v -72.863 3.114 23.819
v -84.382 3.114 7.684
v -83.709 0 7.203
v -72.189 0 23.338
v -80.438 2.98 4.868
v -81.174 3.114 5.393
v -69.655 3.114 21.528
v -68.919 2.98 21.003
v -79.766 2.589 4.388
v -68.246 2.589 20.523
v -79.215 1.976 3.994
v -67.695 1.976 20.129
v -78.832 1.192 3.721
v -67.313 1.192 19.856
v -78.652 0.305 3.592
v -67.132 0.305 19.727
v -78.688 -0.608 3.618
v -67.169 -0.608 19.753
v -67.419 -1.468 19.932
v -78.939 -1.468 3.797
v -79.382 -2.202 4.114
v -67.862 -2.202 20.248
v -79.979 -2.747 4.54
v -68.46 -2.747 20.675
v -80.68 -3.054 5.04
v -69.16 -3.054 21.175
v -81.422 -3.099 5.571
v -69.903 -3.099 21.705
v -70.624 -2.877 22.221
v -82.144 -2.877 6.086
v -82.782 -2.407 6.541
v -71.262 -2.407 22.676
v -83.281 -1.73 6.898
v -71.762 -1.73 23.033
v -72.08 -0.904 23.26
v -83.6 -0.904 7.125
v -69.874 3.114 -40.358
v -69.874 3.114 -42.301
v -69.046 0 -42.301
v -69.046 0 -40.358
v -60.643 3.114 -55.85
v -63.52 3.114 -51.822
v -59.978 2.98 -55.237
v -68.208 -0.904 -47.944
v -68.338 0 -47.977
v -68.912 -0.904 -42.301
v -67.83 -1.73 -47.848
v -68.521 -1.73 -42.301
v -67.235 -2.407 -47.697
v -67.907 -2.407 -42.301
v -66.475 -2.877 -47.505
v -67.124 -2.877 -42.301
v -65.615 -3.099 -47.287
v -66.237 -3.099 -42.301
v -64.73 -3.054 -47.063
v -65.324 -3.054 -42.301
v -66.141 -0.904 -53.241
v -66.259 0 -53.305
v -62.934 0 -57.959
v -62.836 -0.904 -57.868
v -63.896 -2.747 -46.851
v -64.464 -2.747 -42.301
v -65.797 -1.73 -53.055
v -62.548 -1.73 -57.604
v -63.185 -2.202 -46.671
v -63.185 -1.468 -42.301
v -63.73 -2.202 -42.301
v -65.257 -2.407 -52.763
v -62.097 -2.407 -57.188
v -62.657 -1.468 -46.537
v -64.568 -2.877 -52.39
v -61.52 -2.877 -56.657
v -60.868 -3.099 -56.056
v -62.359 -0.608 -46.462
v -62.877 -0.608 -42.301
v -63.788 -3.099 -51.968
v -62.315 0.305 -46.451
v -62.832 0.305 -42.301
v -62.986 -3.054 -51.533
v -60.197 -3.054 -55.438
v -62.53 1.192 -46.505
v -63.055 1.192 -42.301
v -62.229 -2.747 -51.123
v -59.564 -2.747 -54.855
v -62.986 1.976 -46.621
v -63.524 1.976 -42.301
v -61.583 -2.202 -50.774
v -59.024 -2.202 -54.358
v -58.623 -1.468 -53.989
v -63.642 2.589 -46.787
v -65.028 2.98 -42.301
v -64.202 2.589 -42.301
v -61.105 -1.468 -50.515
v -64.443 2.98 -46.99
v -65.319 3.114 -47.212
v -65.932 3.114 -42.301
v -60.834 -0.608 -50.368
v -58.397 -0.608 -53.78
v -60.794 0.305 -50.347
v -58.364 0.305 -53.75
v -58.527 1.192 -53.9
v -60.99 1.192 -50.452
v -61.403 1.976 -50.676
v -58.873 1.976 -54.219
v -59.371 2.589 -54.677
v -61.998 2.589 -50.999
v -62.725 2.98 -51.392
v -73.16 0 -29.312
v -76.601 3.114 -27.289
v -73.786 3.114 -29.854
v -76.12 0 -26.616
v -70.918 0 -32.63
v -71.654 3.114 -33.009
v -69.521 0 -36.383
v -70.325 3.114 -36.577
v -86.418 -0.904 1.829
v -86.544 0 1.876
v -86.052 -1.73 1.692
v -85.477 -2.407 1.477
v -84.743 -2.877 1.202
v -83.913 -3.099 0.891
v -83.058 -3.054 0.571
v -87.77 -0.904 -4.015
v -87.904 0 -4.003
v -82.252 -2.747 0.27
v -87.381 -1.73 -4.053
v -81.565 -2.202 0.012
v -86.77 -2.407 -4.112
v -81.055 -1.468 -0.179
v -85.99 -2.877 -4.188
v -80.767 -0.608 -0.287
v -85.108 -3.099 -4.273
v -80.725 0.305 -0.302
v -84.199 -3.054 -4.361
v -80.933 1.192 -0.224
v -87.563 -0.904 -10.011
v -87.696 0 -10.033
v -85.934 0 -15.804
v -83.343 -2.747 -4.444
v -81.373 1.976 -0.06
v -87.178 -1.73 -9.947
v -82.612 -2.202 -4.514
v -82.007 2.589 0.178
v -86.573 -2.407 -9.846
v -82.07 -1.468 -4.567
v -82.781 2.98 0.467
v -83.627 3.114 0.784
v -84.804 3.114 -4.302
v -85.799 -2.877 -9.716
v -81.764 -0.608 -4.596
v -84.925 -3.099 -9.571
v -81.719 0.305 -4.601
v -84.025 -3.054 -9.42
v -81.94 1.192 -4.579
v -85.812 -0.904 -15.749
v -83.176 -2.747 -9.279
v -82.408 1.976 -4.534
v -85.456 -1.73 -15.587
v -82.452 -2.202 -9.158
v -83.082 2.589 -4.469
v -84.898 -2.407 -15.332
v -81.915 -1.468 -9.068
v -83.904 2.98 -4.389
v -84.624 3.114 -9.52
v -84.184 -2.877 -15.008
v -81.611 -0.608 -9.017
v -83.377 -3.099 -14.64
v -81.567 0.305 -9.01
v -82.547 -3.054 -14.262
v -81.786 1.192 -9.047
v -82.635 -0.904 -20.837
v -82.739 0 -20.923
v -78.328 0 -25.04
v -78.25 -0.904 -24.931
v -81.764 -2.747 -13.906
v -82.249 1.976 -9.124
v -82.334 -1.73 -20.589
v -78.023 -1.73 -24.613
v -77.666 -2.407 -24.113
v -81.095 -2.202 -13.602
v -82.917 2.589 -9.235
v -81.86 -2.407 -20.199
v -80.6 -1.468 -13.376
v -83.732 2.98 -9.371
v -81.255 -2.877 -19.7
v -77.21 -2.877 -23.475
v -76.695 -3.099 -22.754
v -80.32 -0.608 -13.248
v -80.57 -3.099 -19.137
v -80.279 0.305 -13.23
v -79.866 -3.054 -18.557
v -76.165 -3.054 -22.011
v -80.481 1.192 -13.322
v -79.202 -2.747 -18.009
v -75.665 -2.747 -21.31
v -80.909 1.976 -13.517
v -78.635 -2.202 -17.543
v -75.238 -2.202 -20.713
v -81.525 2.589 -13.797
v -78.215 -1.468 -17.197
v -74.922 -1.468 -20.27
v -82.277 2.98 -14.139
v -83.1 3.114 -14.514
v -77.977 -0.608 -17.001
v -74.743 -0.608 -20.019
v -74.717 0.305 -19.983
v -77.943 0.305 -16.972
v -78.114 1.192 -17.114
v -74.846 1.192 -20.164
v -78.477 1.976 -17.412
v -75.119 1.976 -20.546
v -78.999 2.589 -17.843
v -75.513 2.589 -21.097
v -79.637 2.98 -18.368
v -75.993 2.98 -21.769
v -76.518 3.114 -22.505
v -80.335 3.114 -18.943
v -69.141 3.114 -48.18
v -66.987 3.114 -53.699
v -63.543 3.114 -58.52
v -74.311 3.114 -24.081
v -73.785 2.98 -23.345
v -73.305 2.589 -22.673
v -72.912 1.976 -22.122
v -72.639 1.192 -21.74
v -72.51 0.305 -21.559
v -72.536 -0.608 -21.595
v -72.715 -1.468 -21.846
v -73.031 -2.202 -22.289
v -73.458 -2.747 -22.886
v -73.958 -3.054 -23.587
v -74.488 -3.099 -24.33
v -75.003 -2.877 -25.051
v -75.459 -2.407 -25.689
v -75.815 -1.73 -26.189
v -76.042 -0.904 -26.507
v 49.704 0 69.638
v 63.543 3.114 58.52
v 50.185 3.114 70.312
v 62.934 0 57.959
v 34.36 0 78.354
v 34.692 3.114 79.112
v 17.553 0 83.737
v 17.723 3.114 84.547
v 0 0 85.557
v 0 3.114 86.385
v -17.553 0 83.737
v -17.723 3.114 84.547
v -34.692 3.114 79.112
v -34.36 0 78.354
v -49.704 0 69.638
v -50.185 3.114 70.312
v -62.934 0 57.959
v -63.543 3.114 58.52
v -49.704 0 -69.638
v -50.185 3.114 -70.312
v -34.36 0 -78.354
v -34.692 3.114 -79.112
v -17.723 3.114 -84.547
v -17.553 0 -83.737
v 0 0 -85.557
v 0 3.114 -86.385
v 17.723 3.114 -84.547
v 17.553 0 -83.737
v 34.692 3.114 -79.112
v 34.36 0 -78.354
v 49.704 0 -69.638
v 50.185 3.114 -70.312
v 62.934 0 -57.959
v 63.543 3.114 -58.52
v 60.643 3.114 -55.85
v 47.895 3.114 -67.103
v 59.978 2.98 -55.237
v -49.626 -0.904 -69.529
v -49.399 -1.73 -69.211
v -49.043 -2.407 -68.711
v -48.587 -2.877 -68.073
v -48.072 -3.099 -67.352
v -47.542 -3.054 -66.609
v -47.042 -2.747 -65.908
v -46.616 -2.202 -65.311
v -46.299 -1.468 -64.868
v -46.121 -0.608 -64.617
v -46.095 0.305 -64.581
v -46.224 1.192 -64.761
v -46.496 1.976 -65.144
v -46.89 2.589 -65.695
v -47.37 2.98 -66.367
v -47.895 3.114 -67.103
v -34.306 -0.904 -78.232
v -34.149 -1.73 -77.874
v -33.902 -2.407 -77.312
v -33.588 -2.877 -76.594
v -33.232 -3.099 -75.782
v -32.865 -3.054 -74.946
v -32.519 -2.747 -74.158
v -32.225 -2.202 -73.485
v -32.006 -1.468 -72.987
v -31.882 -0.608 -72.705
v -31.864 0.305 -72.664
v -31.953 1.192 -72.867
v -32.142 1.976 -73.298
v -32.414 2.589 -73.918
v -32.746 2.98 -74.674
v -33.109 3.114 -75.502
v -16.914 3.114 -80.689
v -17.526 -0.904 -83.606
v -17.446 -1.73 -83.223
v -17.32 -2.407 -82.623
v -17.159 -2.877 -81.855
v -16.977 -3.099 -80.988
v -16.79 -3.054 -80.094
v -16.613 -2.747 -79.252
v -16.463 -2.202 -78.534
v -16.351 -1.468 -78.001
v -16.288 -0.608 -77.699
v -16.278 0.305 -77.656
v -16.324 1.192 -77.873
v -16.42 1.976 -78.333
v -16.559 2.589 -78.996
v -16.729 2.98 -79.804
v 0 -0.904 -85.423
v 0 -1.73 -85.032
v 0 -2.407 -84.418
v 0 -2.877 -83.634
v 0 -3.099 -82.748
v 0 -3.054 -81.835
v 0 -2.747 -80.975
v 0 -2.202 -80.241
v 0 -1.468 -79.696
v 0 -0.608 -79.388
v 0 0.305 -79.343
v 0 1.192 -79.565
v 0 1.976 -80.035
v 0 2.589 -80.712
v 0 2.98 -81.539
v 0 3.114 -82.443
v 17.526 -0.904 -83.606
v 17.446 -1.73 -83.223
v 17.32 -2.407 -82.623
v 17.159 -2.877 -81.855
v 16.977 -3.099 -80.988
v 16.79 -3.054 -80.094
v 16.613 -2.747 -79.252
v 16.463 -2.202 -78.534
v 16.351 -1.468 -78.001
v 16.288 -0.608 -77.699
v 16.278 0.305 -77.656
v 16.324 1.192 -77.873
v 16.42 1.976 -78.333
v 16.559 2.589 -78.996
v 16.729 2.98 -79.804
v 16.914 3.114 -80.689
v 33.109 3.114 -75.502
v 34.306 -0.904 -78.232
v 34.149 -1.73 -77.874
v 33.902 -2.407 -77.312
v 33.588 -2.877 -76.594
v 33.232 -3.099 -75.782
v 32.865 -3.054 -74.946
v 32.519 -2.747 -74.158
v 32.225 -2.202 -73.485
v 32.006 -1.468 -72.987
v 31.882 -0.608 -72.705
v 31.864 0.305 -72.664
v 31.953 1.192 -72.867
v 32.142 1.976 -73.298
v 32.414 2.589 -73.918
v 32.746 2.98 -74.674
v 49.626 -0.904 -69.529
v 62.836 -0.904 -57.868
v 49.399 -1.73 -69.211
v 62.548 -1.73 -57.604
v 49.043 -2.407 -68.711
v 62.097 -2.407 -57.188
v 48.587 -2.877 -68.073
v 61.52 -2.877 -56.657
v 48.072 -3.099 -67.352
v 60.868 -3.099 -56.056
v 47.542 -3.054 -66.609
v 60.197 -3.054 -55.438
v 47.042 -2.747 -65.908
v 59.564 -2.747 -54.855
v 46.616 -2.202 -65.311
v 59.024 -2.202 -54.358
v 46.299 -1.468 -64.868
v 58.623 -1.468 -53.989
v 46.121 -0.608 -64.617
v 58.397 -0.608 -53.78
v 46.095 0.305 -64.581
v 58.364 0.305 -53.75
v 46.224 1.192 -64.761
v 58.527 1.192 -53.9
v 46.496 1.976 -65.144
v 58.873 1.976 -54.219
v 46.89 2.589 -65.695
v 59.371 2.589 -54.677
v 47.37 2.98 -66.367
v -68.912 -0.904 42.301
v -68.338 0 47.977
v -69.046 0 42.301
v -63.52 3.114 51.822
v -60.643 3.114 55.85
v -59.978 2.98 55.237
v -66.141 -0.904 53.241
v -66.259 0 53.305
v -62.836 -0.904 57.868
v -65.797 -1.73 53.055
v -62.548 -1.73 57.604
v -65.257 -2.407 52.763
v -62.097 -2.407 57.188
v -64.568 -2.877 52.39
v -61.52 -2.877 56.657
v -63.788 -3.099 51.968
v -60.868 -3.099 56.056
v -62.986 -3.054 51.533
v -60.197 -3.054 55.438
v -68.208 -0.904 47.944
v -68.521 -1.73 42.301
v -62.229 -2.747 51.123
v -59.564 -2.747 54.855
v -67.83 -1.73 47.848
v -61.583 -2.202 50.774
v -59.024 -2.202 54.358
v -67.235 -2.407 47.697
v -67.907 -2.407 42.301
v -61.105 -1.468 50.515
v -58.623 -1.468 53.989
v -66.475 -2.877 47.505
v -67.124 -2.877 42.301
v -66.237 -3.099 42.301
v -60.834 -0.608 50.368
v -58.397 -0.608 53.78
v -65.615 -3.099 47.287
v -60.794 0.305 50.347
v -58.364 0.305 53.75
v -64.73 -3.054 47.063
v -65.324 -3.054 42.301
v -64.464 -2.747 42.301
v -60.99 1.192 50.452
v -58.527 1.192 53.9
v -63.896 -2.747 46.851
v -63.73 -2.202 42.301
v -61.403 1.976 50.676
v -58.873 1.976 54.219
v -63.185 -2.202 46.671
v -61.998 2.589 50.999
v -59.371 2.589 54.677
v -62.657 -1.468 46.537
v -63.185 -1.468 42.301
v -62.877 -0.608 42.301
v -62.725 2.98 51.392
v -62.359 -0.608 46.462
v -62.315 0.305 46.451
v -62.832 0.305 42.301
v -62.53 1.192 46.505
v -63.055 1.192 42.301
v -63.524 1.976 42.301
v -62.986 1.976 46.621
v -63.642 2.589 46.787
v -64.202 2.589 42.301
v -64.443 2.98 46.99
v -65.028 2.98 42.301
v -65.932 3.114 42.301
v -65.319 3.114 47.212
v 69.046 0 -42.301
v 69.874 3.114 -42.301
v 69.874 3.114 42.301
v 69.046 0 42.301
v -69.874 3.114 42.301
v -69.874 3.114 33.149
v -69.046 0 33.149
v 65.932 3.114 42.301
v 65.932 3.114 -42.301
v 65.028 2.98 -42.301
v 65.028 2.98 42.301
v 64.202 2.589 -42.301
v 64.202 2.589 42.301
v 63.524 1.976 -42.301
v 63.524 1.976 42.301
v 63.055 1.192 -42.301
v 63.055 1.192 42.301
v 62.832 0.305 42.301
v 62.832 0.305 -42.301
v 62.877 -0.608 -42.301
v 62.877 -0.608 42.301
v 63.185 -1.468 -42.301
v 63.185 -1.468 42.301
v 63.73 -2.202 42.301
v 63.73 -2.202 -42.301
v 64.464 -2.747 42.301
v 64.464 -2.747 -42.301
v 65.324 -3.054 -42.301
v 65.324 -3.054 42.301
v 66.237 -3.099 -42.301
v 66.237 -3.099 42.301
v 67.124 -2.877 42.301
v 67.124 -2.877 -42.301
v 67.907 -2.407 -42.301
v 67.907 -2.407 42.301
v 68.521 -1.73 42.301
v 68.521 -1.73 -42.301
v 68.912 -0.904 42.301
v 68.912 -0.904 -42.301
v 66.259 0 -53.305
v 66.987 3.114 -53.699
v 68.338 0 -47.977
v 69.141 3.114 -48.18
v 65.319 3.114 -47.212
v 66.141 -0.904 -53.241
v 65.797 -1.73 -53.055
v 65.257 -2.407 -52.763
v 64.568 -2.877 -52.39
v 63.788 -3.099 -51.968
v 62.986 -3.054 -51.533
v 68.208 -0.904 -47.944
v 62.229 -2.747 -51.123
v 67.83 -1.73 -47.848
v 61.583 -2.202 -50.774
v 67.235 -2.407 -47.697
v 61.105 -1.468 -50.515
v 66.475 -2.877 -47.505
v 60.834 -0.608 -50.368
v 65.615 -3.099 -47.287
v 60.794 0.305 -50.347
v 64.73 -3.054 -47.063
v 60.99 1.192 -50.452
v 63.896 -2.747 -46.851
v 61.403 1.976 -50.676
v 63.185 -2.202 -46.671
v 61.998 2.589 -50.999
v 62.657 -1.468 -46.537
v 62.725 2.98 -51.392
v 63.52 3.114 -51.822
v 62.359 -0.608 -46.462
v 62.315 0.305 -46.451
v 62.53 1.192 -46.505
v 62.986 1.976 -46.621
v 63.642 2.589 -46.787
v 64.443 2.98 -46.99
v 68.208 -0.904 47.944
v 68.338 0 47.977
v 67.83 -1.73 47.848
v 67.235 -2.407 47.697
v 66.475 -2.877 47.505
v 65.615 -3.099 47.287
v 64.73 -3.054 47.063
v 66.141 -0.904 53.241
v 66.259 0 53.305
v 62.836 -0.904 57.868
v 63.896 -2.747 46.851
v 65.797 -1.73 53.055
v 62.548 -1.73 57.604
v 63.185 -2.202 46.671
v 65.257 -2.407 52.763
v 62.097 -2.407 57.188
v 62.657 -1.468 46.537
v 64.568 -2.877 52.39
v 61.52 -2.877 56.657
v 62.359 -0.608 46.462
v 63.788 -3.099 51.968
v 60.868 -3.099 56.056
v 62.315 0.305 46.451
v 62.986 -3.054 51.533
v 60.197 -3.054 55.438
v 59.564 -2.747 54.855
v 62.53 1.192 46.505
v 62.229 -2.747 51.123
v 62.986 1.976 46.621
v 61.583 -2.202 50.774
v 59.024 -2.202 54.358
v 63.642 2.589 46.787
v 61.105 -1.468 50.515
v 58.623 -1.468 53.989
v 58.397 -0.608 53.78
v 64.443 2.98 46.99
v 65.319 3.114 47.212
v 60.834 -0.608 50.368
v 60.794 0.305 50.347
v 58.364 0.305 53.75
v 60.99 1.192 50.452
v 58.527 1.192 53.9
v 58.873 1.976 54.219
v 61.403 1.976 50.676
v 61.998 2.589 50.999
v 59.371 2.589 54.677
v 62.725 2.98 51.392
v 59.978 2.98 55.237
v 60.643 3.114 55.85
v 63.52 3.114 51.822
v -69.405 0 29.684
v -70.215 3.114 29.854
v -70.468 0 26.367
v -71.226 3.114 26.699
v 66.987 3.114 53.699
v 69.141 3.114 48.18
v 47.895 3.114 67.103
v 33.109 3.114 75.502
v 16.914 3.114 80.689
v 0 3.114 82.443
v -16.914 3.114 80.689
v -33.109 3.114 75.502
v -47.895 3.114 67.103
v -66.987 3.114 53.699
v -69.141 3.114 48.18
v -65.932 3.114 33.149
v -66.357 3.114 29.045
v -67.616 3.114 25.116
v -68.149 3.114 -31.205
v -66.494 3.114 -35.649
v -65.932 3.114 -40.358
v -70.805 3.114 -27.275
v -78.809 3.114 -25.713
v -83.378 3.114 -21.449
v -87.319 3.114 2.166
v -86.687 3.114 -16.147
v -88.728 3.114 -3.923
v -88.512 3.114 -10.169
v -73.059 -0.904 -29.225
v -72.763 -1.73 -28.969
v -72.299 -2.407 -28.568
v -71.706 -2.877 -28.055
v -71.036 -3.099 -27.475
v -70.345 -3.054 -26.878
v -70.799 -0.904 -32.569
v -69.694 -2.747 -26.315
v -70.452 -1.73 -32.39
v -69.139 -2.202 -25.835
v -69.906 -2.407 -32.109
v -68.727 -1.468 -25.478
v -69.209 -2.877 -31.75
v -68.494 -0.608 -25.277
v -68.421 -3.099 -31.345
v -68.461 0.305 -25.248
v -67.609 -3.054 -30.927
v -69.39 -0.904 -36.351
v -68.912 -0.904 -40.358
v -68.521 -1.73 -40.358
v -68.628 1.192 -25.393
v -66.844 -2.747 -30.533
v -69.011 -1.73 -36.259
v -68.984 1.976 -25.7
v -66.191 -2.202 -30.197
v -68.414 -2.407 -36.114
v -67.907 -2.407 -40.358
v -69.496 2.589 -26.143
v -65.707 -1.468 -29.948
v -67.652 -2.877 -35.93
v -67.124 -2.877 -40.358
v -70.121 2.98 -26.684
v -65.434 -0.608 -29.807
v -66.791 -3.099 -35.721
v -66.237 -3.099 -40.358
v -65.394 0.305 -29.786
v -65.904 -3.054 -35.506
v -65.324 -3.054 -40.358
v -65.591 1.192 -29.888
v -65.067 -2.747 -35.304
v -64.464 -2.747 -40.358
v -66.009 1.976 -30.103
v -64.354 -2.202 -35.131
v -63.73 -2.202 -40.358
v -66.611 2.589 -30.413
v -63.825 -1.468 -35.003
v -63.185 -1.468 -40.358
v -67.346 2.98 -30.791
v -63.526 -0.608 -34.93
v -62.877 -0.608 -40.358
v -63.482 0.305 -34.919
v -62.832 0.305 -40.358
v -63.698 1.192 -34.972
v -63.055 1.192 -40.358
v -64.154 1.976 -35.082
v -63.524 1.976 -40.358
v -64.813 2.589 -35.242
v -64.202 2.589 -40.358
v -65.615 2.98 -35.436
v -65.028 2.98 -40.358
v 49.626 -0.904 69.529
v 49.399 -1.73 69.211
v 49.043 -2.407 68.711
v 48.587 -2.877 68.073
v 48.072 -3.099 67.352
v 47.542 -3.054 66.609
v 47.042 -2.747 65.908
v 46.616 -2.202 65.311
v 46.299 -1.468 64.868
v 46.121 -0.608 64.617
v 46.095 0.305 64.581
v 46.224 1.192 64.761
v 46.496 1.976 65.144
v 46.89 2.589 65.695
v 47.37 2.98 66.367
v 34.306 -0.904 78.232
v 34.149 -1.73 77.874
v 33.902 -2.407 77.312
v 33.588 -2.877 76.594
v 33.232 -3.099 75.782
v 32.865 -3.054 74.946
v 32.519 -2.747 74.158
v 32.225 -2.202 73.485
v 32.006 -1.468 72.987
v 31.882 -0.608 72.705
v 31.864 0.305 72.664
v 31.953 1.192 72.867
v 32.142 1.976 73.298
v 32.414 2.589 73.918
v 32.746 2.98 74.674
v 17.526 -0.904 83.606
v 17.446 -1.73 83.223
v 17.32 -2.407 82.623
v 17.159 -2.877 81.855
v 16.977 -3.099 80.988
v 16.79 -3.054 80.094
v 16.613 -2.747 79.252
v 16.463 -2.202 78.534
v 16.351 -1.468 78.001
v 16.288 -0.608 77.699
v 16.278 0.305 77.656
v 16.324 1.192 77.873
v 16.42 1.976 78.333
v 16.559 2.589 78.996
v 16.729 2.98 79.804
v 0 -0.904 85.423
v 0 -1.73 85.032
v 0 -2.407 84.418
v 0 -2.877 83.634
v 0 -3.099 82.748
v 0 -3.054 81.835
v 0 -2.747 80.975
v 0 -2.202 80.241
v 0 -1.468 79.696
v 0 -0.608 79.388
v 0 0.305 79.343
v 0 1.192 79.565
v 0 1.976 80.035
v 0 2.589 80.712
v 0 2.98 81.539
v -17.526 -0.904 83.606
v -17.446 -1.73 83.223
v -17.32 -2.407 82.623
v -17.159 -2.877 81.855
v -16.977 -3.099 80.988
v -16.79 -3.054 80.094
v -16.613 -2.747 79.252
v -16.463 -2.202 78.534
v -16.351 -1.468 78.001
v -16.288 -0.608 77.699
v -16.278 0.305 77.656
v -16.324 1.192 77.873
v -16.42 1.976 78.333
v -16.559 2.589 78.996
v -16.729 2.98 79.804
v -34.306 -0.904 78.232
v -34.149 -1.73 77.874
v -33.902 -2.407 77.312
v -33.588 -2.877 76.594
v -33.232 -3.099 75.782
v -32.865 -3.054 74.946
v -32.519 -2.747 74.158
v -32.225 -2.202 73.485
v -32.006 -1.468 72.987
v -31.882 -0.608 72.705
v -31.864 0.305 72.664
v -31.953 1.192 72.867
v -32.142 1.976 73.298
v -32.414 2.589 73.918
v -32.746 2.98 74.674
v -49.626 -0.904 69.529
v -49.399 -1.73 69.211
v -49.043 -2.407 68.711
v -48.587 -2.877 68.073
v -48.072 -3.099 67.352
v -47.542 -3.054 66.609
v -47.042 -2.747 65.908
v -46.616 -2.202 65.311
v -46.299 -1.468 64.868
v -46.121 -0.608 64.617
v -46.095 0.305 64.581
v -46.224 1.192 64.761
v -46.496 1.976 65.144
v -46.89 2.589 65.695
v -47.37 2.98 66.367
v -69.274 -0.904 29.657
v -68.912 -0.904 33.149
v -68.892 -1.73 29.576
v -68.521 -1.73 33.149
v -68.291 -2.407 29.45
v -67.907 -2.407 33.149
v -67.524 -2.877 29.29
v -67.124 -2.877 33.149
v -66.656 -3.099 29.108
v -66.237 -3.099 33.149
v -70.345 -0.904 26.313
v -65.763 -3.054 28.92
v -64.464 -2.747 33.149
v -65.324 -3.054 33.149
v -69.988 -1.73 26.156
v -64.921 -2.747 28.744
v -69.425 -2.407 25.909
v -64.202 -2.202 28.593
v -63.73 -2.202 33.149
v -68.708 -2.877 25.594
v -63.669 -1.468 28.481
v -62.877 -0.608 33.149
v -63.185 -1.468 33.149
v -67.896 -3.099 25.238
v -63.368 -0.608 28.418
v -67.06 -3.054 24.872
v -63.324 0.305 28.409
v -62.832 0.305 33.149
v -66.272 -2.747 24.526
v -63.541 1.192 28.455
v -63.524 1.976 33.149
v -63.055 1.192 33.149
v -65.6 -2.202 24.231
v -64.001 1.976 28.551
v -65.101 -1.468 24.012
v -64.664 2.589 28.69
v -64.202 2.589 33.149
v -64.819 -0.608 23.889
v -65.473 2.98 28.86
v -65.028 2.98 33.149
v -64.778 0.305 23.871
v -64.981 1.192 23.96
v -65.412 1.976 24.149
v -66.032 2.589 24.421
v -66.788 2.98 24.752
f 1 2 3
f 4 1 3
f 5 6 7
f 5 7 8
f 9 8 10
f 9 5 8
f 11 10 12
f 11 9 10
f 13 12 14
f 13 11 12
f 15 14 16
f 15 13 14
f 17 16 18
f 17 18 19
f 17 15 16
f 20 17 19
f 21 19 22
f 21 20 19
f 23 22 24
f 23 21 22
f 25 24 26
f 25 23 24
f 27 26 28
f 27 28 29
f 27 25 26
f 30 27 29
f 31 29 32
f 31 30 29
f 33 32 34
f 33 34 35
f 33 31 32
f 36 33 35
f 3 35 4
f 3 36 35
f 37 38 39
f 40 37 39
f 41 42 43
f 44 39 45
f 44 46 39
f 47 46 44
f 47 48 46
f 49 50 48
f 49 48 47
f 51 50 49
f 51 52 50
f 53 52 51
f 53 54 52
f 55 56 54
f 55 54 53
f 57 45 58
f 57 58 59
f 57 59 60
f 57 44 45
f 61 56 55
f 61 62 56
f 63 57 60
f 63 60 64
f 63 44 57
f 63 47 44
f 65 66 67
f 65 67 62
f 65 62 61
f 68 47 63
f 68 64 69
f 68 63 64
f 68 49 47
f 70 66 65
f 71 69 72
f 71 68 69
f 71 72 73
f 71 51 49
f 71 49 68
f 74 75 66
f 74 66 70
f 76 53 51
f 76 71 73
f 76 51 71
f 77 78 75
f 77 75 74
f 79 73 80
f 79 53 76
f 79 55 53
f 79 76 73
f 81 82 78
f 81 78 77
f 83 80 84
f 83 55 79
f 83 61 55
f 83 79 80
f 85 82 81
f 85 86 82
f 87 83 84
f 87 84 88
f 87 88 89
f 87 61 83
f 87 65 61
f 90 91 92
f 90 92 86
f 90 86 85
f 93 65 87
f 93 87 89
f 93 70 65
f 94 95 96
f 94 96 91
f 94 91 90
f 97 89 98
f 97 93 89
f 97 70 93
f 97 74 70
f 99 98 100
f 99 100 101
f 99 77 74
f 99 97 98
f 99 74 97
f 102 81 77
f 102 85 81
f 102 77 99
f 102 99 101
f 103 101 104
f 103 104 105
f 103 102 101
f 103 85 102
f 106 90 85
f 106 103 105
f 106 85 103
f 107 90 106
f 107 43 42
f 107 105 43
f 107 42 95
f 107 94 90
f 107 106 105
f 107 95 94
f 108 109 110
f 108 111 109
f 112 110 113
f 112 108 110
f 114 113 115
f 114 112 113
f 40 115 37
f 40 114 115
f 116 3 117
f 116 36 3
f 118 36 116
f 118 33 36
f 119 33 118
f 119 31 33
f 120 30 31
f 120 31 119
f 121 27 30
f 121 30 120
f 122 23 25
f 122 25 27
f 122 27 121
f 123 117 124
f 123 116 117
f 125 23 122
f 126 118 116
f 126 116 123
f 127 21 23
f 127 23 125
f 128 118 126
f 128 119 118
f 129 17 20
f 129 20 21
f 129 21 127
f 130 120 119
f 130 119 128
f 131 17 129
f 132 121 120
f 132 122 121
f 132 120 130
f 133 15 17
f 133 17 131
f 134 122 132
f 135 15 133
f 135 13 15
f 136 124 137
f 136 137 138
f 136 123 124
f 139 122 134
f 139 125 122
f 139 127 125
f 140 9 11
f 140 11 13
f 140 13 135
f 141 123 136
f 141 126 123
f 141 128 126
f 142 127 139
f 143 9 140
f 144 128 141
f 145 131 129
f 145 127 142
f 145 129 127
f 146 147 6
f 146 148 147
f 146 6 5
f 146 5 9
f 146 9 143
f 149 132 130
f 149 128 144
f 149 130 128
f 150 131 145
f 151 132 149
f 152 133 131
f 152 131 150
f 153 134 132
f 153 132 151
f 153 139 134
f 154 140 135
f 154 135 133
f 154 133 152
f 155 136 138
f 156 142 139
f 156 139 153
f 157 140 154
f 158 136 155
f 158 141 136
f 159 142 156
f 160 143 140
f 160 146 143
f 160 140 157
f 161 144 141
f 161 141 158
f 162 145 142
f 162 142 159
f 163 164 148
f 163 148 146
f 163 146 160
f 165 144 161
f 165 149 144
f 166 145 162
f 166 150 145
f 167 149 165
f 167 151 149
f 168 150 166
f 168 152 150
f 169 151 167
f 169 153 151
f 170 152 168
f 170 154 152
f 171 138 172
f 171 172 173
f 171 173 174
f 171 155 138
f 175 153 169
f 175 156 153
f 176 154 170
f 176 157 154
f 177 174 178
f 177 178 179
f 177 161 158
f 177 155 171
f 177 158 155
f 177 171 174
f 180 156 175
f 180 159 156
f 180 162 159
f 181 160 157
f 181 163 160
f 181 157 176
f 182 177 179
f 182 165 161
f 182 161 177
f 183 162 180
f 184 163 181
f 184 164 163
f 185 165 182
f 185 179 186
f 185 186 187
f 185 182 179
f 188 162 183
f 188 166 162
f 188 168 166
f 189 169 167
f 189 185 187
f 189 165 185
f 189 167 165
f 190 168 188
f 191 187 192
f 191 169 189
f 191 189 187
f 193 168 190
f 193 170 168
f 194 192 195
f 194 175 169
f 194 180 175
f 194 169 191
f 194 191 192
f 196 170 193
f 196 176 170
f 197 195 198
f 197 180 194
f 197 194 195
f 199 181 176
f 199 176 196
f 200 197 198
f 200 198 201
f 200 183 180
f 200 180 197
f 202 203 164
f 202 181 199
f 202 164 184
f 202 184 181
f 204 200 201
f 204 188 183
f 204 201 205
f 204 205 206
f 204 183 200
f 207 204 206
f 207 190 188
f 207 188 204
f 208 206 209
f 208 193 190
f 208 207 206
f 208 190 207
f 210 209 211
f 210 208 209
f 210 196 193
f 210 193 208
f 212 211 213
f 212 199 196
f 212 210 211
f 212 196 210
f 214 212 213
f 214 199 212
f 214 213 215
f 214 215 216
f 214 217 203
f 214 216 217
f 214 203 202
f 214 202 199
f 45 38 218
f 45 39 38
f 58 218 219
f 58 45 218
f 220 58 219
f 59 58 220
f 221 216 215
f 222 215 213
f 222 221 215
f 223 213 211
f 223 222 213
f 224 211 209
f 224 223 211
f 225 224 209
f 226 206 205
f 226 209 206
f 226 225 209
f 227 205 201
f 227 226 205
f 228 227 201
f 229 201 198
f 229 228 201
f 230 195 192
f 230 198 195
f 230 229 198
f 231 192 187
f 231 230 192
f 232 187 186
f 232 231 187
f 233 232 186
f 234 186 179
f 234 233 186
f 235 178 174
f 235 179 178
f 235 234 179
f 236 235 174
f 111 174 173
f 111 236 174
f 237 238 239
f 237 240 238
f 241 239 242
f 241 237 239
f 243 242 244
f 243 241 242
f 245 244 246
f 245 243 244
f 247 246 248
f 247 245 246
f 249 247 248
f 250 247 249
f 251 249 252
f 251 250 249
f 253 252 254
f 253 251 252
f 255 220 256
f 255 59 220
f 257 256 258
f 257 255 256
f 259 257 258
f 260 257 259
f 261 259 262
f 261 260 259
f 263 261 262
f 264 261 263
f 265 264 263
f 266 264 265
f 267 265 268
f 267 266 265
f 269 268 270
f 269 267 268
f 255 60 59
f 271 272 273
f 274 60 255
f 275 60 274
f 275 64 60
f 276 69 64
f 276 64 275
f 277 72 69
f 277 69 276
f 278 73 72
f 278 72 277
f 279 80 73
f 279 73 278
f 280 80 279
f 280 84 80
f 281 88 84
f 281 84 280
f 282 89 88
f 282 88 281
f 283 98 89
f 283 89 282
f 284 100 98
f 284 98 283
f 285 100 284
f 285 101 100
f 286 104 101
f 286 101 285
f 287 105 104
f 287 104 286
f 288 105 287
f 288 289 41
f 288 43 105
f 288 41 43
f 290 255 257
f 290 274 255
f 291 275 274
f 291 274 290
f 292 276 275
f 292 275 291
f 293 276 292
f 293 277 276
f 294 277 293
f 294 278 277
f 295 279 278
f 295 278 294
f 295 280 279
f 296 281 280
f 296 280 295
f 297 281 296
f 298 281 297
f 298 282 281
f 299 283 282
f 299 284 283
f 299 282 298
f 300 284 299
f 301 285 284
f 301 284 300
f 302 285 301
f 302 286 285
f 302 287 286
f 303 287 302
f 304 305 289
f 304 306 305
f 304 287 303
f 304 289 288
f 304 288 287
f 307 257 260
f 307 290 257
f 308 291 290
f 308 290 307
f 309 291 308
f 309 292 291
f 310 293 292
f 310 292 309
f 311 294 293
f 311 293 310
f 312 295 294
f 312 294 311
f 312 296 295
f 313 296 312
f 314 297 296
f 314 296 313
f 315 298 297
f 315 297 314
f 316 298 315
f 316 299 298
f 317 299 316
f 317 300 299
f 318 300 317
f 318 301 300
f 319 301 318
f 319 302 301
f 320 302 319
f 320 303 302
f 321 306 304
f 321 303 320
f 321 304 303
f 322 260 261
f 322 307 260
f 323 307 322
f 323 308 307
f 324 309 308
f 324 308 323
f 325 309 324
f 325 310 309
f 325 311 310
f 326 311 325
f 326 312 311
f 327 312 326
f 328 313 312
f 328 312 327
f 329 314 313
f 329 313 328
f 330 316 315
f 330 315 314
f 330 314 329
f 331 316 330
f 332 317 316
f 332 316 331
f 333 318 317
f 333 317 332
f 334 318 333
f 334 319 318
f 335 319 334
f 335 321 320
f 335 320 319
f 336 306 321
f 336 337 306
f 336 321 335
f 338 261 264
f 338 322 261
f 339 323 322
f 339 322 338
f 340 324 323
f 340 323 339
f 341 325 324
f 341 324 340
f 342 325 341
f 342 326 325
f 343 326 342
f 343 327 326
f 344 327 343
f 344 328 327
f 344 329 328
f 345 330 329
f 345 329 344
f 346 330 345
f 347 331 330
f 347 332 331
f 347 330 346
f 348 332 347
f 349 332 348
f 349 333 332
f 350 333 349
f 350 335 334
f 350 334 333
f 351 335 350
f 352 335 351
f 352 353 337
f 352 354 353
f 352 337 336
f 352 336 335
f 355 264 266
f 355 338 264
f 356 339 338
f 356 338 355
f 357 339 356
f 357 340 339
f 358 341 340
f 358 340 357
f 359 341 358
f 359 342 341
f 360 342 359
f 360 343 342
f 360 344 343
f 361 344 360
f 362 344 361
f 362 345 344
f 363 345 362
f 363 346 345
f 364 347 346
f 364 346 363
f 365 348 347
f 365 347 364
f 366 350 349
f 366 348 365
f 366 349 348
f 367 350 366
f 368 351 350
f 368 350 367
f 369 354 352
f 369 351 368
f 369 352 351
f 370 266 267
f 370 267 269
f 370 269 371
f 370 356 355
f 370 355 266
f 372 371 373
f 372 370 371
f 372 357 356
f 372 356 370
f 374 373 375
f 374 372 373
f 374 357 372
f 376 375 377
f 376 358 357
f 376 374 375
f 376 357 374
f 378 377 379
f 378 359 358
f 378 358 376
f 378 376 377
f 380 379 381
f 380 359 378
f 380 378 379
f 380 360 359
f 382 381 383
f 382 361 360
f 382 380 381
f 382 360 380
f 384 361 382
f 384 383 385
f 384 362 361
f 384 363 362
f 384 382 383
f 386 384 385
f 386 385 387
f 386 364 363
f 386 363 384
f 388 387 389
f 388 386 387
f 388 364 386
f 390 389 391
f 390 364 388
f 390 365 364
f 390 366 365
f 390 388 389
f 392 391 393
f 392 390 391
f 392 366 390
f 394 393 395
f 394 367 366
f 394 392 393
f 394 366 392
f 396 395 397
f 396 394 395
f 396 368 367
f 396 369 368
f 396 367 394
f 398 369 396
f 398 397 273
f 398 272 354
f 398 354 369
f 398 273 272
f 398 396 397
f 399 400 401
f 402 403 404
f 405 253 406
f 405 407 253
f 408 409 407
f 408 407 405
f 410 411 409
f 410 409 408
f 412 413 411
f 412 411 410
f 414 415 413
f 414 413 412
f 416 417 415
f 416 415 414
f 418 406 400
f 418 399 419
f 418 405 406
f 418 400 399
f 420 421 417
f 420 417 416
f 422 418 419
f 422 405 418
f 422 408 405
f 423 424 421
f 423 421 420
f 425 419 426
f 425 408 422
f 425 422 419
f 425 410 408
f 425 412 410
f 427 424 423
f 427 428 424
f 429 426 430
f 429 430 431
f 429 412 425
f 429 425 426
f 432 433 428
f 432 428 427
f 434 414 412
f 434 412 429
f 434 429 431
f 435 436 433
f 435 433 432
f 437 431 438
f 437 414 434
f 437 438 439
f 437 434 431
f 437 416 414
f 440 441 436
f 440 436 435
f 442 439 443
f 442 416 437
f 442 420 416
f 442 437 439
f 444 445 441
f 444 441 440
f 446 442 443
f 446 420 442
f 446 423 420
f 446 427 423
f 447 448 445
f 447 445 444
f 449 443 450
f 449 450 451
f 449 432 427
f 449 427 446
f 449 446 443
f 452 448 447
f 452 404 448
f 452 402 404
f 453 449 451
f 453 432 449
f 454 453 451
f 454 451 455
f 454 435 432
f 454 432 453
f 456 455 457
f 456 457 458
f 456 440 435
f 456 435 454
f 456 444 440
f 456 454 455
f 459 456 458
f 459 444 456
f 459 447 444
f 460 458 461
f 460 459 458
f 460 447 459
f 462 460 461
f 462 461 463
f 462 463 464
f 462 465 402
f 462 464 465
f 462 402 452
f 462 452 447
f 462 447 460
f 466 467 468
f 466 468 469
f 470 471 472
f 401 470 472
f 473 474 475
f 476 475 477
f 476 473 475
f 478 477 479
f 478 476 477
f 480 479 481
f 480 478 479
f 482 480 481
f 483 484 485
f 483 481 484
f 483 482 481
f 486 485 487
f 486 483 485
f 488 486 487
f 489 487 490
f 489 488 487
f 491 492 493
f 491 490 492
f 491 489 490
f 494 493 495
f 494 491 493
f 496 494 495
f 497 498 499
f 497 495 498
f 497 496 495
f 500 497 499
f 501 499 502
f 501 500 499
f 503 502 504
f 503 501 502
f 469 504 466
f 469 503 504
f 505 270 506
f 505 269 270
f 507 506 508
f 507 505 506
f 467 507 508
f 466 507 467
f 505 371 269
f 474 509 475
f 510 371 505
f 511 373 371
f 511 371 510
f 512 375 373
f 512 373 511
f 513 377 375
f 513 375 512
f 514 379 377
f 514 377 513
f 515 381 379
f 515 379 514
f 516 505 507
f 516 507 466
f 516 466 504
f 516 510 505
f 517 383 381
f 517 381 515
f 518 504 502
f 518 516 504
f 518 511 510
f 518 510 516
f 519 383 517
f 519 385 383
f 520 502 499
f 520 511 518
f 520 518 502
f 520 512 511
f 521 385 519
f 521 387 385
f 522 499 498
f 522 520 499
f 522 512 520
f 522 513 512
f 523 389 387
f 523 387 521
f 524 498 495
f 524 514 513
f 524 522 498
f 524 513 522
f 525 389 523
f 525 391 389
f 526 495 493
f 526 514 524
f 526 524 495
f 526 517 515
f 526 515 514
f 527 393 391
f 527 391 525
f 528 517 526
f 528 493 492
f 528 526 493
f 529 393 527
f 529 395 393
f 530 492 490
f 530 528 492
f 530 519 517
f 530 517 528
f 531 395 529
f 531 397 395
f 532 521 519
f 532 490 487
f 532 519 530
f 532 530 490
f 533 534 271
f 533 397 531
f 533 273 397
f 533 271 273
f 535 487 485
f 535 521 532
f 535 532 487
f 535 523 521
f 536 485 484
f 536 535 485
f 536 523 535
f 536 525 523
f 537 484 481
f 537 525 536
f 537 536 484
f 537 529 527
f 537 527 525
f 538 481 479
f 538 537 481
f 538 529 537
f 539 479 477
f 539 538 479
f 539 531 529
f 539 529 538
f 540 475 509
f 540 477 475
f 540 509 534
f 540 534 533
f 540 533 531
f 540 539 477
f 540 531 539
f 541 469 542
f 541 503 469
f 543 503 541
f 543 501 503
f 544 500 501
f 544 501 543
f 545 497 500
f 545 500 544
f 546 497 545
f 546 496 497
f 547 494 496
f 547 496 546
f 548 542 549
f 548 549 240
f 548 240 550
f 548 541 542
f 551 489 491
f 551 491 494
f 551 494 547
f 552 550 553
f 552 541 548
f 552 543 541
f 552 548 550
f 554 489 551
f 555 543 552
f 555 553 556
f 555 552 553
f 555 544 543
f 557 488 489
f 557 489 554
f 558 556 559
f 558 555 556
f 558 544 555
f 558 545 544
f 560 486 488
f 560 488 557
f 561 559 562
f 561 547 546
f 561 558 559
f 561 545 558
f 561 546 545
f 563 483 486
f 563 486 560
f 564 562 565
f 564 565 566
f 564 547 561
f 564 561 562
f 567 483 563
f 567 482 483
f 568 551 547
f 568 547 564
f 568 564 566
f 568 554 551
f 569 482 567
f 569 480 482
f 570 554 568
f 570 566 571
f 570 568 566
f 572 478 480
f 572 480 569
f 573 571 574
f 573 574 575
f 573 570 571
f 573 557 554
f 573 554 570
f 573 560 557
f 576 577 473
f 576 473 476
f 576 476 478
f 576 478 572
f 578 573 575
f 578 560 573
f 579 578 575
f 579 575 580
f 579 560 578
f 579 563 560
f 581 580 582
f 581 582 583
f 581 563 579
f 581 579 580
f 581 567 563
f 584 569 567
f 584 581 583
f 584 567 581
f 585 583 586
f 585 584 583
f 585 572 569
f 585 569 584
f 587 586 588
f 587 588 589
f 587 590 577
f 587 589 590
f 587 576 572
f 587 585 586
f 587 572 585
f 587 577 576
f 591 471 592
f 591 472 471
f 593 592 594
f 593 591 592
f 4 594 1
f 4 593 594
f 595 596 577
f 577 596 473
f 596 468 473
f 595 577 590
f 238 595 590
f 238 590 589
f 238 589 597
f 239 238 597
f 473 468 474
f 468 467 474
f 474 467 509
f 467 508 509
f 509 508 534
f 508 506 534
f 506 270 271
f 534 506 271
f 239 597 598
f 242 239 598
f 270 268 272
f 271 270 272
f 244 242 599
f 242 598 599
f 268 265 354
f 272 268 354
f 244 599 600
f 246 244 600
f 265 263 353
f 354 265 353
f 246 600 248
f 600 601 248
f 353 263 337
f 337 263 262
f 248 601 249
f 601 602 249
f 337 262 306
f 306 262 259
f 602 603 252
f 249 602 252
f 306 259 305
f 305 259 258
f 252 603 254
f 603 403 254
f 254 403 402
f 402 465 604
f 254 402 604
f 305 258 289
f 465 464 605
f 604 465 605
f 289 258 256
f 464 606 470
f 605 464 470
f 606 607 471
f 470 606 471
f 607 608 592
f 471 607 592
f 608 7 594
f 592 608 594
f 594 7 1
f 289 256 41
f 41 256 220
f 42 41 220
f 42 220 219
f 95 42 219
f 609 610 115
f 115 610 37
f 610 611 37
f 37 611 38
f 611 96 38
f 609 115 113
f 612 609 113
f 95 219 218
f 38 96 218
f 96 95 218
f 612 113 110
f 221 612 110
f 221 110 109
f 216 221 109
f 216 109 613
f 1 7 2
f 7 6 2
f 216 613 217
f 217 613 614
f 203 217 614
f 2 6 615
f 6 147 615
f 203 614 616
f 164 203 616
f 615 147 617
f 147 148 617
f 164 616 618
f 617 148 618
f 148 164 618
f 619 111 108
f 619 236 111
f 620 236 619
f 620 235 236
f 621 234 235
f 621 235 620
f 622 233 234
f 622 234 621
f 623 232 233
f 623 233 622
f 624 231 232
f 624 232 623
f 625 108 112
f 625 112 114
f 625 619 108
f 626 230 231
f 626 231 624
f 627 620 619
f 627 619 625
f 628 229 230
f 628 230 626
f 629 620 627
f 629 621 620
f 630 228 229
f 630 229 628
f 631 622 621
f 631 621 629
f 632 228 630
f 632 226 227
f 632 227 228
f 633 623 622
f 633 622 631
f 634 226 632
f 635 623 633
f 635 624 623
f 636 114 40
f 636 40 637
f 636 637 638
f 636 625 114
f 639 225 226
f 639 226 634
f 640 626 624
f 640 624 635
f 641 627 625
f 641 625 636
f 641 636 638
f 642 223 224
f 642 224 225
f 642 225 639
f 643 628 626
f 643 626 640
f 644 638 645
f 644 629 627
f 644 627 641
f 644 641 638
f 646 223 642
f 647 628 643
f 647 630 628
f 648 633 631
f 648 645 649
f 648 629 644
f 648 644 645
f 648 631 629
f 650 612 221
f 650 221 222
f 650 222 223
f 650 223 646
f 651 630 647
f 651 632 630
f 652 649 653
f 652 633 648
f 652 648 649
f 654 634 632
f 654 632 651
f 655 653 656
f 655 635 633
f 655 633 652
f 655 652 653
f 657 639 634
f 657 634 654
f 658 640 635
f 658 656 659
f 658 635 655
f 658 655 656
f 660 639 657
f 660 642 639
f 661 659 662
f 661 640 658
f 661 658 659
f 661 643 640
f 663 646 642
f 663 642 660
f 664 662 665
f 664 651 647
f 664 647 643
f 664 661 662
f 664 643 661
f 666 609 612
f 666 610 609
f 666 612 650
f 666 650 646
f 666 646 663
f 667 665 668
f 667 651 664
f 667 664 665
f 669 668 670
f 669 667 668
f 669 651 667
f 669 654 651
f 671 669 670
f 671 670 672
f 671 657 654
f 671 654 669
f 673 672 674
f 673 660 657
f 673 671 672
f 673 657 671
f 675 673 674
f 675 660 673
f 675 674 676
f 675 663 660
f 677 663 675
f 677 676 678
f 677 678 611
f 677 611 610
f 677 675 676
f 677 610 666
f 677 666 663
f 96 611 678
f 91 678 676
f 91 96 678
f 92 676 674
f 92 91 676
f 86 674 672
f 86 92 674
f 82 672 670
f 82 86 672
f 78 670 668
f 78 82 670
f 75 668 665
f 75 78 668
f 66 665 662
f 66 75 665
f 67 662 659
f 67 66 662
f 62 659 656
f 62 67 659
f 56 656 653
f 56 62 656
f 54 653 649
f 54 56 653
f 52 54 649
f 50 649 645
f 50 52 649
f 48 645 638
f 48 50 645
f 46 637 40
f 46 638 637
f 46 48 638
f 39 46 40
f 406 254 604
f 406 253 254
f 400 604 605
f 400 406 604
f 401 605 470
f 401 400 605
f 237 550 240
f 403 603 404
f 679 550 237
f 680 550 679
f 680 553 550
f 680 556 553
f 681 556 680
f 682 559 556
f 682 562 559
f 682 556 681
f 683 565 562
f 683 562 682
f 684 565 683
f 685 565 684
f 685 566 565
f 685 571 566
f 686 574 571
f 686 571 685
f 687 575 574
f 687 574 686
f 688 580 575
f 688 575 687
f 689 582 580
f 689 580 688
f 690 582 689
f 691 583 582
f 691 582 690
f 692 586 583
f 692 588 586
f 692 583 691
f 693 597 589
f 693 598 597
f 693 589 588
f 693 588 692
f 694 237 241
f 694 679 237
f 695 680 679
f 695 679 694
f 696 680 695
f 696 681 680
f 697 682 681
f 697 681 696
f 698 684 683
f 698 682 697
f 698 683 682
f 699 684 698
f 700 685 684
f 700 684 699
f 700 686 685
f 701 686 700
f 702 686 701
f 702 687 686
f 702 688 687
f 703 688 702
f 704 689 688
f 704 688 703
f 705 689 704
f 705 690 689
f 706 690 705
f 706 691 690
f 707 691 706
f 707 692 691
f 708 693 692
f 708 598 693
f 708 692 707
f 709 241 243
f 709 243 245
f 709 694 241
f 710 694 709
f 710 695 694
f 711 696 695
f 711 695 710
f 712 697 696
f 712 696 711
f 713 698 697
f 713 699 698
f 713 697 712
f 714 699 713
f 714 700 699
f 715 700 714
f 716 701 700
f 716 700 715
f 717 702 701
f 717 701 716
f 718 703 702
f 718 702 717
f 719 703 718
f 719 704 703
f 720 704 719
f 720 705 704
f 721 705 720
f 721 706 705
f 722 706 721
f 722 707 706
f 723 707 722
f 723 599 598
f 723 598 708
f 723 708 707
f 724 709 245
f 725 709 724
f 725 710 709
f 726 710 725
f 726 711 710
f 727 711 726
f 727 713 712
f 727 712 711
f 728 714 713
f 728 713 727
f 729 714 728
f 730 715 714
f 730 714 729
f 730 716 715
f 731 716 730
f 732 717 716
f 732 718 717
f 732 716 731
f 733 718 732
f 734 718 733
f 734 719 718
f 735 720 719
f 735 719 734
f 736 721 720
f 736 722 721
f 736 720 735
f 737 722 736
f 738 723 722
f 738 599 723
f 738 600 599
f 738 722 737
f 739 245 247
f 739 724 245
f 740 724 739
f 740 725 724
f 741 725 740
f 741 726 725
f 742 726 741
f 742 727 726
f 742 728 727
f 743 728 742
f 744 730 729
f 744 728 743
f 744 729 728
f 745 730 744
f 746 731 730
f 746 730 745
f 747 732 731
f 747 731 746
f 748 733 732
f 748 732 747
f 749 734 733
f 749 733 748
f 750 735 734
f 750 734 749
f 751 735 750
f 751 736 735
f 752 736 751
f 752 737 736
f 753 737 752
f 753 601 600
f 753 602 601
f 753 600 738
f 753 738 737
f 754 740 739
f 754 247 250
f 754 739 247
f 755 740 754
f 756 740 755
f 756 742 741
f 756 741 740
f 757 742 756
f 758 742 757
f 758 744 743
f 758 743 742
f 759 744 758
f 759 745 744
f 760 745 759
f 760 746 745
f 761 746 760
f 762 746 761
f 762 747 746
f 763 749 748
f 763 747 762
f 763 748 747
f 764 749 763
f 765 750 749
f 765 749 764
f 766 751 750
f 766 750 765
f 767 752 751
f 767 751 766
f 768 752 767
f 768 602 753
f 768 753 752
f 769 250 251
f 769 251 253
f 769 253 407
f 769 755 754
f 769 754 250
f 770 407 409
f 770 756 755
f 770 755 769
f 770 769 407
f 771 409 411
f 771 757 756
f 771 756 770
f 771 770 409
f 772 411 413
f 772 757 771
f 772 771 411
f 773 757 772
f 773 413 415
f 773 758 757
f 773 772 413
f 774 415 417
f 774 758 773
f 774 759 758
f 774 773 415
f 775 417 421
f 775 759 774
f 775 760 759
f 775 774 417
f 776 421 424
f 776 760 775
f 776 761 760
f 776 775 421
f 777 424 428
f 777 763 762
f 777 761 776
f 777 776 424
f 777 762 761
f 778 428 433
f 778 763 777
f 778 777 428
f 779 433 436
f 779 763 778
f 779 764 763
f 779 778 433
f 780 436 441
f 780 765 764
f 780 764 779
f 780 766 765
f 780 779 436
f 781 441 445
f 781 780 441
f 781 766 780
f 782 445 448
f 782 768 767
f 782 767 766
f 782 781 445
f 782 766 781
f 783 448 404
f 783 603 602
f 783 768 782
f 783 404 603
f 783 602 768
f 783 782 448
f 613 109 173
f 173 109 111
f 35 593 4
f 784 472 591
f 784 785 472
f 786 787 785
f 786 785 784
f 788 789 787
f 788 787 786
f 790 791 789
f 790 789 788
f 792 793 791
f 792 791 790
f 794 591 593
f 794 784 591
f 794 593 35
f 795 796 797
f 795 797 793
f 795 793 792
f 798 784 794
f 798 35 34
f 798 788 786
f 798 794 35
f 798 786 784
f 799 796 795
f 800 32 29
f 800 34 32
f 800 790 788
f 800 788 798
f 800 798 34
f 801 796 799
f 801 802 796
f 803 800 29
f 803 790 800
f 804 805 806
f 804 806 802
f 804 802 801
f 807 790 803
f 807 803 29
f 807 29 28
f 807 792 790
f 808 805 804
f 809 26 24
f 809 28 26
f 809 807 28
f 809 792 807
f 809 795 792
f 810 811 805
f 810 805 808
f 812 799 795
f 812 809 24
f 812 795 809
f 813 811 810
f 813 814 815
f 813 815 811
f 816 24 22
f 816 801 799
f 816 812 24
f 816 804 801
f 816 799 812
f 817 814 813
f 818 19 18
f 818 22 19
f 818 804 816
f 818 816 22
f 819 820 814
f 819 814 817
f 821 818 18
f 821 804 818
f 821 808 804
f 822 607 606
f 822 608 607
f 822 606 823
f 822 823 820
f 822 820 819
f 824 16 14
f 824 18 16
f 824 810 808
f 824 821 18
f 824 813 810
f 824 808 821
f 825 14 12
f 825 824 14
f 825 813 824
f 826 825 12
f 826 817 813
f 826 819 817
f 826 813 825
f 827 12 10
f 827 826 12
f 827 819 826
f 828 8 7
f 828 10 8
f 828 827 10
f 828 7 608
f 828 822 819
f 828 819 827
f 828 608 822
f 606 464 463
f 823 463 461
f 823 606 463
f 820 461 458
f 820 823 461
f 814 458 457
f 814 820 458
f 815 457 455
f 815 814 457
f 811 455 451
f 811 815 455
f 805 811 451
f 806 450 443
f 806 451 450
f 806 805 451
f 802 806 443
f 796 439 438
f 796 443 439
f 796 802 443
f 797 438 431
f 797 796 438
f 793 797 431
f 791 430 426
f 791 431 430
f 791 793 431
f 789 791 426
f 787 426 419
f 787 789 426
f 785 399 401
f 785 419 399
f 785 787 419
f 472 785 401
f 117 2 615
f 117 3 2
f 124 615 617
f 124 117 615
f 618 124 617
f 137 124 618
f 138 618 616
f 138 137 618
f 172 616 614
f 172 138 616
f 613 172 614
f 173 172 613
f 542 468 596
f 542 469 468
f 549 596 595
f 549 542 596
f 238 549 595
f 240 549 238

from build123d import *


with BuildPart() as part:
    # Austragung1: sweep along a path in Skizze1
    with BuildLine(Plane(origin=(0, 0, 0), x_dir=(1, 0, 0), z_dir=(0, 1, 0))) as austragung1_path:
        Line((-69.654529262, -21.528063223), (-81.174051866, -5.393202266))
        ThreePointArc((-81.174051866, -5.393202266), (-84.623968891, 9.520303277), (-76.517987713, 22.5052039))
        Line((-76.517987713, 22.5052039), (-74.310593415, 24.081178344))
        ThreePointArc((-74.310593415, 24.081178344), (-68.149421773, 31.204819131), (-65.931764421, 40.358413503))
        Line((-65.931764421, 40.358413503), (-65.931764421, 42.300814045))
        ThreePointArc((-65.931764421, 42.300814045), (-64.562830296, 49.572910331), (-60.643425983, 55.849504539))
        ThreePointArc((-60.643425983, 55.849504539), (0, 82.442660512), (60.643425983, 55.849504539))
        ThreePointArc((60.643425983, 55.849504539), (64.562830296, 49.572910331), (65.931764421, 42.300814045))
        Line((65.931764421, 42.300814045), (65.931764421, -42.300814045))
        ThreePointArc((65.931764421, -42.300814045), (64.562830296, -49.572910331), (60.643425983, -55.849504539))
        ThreePointArc((60.643425983, -55.849504539), (0, -82.442660512), (-60.643425983, -55.849504539))
        ThreePointArc((-60.643425983, -55.849504539), (-64.562830296, -49.572910331), (-65.931764421, -42.300814045))
        Line((-65.931764421, -42.300814045), (-65.931764421, -33.149234229))
        ThreePointArc((-65.931764421, -33.149234229), (-66.885180696, -27.04778781), (-69.654529262, -21.528063223))
    # Skizze2 → Austragung1 (sweep)
    with BuildSketch(Plane(origin=(0, 0, 0), x_dir=(0, 0, -1), z_dir=(1, 0, 0))):
        with BuildLine():
            Line((-82.442660512, 3.114282512), (-86.384630622, 3.114282512))
            Line((-86.384630622, 3.114282512), (-85.556943024, 0))
            ThreePointArc((-85.556943024, 0), (-80.240530229, -2.202130283), (-82.442660512, 3.114282512))
        make_face()
    sweep(path=austragung1_path.line)


solid = part.part
